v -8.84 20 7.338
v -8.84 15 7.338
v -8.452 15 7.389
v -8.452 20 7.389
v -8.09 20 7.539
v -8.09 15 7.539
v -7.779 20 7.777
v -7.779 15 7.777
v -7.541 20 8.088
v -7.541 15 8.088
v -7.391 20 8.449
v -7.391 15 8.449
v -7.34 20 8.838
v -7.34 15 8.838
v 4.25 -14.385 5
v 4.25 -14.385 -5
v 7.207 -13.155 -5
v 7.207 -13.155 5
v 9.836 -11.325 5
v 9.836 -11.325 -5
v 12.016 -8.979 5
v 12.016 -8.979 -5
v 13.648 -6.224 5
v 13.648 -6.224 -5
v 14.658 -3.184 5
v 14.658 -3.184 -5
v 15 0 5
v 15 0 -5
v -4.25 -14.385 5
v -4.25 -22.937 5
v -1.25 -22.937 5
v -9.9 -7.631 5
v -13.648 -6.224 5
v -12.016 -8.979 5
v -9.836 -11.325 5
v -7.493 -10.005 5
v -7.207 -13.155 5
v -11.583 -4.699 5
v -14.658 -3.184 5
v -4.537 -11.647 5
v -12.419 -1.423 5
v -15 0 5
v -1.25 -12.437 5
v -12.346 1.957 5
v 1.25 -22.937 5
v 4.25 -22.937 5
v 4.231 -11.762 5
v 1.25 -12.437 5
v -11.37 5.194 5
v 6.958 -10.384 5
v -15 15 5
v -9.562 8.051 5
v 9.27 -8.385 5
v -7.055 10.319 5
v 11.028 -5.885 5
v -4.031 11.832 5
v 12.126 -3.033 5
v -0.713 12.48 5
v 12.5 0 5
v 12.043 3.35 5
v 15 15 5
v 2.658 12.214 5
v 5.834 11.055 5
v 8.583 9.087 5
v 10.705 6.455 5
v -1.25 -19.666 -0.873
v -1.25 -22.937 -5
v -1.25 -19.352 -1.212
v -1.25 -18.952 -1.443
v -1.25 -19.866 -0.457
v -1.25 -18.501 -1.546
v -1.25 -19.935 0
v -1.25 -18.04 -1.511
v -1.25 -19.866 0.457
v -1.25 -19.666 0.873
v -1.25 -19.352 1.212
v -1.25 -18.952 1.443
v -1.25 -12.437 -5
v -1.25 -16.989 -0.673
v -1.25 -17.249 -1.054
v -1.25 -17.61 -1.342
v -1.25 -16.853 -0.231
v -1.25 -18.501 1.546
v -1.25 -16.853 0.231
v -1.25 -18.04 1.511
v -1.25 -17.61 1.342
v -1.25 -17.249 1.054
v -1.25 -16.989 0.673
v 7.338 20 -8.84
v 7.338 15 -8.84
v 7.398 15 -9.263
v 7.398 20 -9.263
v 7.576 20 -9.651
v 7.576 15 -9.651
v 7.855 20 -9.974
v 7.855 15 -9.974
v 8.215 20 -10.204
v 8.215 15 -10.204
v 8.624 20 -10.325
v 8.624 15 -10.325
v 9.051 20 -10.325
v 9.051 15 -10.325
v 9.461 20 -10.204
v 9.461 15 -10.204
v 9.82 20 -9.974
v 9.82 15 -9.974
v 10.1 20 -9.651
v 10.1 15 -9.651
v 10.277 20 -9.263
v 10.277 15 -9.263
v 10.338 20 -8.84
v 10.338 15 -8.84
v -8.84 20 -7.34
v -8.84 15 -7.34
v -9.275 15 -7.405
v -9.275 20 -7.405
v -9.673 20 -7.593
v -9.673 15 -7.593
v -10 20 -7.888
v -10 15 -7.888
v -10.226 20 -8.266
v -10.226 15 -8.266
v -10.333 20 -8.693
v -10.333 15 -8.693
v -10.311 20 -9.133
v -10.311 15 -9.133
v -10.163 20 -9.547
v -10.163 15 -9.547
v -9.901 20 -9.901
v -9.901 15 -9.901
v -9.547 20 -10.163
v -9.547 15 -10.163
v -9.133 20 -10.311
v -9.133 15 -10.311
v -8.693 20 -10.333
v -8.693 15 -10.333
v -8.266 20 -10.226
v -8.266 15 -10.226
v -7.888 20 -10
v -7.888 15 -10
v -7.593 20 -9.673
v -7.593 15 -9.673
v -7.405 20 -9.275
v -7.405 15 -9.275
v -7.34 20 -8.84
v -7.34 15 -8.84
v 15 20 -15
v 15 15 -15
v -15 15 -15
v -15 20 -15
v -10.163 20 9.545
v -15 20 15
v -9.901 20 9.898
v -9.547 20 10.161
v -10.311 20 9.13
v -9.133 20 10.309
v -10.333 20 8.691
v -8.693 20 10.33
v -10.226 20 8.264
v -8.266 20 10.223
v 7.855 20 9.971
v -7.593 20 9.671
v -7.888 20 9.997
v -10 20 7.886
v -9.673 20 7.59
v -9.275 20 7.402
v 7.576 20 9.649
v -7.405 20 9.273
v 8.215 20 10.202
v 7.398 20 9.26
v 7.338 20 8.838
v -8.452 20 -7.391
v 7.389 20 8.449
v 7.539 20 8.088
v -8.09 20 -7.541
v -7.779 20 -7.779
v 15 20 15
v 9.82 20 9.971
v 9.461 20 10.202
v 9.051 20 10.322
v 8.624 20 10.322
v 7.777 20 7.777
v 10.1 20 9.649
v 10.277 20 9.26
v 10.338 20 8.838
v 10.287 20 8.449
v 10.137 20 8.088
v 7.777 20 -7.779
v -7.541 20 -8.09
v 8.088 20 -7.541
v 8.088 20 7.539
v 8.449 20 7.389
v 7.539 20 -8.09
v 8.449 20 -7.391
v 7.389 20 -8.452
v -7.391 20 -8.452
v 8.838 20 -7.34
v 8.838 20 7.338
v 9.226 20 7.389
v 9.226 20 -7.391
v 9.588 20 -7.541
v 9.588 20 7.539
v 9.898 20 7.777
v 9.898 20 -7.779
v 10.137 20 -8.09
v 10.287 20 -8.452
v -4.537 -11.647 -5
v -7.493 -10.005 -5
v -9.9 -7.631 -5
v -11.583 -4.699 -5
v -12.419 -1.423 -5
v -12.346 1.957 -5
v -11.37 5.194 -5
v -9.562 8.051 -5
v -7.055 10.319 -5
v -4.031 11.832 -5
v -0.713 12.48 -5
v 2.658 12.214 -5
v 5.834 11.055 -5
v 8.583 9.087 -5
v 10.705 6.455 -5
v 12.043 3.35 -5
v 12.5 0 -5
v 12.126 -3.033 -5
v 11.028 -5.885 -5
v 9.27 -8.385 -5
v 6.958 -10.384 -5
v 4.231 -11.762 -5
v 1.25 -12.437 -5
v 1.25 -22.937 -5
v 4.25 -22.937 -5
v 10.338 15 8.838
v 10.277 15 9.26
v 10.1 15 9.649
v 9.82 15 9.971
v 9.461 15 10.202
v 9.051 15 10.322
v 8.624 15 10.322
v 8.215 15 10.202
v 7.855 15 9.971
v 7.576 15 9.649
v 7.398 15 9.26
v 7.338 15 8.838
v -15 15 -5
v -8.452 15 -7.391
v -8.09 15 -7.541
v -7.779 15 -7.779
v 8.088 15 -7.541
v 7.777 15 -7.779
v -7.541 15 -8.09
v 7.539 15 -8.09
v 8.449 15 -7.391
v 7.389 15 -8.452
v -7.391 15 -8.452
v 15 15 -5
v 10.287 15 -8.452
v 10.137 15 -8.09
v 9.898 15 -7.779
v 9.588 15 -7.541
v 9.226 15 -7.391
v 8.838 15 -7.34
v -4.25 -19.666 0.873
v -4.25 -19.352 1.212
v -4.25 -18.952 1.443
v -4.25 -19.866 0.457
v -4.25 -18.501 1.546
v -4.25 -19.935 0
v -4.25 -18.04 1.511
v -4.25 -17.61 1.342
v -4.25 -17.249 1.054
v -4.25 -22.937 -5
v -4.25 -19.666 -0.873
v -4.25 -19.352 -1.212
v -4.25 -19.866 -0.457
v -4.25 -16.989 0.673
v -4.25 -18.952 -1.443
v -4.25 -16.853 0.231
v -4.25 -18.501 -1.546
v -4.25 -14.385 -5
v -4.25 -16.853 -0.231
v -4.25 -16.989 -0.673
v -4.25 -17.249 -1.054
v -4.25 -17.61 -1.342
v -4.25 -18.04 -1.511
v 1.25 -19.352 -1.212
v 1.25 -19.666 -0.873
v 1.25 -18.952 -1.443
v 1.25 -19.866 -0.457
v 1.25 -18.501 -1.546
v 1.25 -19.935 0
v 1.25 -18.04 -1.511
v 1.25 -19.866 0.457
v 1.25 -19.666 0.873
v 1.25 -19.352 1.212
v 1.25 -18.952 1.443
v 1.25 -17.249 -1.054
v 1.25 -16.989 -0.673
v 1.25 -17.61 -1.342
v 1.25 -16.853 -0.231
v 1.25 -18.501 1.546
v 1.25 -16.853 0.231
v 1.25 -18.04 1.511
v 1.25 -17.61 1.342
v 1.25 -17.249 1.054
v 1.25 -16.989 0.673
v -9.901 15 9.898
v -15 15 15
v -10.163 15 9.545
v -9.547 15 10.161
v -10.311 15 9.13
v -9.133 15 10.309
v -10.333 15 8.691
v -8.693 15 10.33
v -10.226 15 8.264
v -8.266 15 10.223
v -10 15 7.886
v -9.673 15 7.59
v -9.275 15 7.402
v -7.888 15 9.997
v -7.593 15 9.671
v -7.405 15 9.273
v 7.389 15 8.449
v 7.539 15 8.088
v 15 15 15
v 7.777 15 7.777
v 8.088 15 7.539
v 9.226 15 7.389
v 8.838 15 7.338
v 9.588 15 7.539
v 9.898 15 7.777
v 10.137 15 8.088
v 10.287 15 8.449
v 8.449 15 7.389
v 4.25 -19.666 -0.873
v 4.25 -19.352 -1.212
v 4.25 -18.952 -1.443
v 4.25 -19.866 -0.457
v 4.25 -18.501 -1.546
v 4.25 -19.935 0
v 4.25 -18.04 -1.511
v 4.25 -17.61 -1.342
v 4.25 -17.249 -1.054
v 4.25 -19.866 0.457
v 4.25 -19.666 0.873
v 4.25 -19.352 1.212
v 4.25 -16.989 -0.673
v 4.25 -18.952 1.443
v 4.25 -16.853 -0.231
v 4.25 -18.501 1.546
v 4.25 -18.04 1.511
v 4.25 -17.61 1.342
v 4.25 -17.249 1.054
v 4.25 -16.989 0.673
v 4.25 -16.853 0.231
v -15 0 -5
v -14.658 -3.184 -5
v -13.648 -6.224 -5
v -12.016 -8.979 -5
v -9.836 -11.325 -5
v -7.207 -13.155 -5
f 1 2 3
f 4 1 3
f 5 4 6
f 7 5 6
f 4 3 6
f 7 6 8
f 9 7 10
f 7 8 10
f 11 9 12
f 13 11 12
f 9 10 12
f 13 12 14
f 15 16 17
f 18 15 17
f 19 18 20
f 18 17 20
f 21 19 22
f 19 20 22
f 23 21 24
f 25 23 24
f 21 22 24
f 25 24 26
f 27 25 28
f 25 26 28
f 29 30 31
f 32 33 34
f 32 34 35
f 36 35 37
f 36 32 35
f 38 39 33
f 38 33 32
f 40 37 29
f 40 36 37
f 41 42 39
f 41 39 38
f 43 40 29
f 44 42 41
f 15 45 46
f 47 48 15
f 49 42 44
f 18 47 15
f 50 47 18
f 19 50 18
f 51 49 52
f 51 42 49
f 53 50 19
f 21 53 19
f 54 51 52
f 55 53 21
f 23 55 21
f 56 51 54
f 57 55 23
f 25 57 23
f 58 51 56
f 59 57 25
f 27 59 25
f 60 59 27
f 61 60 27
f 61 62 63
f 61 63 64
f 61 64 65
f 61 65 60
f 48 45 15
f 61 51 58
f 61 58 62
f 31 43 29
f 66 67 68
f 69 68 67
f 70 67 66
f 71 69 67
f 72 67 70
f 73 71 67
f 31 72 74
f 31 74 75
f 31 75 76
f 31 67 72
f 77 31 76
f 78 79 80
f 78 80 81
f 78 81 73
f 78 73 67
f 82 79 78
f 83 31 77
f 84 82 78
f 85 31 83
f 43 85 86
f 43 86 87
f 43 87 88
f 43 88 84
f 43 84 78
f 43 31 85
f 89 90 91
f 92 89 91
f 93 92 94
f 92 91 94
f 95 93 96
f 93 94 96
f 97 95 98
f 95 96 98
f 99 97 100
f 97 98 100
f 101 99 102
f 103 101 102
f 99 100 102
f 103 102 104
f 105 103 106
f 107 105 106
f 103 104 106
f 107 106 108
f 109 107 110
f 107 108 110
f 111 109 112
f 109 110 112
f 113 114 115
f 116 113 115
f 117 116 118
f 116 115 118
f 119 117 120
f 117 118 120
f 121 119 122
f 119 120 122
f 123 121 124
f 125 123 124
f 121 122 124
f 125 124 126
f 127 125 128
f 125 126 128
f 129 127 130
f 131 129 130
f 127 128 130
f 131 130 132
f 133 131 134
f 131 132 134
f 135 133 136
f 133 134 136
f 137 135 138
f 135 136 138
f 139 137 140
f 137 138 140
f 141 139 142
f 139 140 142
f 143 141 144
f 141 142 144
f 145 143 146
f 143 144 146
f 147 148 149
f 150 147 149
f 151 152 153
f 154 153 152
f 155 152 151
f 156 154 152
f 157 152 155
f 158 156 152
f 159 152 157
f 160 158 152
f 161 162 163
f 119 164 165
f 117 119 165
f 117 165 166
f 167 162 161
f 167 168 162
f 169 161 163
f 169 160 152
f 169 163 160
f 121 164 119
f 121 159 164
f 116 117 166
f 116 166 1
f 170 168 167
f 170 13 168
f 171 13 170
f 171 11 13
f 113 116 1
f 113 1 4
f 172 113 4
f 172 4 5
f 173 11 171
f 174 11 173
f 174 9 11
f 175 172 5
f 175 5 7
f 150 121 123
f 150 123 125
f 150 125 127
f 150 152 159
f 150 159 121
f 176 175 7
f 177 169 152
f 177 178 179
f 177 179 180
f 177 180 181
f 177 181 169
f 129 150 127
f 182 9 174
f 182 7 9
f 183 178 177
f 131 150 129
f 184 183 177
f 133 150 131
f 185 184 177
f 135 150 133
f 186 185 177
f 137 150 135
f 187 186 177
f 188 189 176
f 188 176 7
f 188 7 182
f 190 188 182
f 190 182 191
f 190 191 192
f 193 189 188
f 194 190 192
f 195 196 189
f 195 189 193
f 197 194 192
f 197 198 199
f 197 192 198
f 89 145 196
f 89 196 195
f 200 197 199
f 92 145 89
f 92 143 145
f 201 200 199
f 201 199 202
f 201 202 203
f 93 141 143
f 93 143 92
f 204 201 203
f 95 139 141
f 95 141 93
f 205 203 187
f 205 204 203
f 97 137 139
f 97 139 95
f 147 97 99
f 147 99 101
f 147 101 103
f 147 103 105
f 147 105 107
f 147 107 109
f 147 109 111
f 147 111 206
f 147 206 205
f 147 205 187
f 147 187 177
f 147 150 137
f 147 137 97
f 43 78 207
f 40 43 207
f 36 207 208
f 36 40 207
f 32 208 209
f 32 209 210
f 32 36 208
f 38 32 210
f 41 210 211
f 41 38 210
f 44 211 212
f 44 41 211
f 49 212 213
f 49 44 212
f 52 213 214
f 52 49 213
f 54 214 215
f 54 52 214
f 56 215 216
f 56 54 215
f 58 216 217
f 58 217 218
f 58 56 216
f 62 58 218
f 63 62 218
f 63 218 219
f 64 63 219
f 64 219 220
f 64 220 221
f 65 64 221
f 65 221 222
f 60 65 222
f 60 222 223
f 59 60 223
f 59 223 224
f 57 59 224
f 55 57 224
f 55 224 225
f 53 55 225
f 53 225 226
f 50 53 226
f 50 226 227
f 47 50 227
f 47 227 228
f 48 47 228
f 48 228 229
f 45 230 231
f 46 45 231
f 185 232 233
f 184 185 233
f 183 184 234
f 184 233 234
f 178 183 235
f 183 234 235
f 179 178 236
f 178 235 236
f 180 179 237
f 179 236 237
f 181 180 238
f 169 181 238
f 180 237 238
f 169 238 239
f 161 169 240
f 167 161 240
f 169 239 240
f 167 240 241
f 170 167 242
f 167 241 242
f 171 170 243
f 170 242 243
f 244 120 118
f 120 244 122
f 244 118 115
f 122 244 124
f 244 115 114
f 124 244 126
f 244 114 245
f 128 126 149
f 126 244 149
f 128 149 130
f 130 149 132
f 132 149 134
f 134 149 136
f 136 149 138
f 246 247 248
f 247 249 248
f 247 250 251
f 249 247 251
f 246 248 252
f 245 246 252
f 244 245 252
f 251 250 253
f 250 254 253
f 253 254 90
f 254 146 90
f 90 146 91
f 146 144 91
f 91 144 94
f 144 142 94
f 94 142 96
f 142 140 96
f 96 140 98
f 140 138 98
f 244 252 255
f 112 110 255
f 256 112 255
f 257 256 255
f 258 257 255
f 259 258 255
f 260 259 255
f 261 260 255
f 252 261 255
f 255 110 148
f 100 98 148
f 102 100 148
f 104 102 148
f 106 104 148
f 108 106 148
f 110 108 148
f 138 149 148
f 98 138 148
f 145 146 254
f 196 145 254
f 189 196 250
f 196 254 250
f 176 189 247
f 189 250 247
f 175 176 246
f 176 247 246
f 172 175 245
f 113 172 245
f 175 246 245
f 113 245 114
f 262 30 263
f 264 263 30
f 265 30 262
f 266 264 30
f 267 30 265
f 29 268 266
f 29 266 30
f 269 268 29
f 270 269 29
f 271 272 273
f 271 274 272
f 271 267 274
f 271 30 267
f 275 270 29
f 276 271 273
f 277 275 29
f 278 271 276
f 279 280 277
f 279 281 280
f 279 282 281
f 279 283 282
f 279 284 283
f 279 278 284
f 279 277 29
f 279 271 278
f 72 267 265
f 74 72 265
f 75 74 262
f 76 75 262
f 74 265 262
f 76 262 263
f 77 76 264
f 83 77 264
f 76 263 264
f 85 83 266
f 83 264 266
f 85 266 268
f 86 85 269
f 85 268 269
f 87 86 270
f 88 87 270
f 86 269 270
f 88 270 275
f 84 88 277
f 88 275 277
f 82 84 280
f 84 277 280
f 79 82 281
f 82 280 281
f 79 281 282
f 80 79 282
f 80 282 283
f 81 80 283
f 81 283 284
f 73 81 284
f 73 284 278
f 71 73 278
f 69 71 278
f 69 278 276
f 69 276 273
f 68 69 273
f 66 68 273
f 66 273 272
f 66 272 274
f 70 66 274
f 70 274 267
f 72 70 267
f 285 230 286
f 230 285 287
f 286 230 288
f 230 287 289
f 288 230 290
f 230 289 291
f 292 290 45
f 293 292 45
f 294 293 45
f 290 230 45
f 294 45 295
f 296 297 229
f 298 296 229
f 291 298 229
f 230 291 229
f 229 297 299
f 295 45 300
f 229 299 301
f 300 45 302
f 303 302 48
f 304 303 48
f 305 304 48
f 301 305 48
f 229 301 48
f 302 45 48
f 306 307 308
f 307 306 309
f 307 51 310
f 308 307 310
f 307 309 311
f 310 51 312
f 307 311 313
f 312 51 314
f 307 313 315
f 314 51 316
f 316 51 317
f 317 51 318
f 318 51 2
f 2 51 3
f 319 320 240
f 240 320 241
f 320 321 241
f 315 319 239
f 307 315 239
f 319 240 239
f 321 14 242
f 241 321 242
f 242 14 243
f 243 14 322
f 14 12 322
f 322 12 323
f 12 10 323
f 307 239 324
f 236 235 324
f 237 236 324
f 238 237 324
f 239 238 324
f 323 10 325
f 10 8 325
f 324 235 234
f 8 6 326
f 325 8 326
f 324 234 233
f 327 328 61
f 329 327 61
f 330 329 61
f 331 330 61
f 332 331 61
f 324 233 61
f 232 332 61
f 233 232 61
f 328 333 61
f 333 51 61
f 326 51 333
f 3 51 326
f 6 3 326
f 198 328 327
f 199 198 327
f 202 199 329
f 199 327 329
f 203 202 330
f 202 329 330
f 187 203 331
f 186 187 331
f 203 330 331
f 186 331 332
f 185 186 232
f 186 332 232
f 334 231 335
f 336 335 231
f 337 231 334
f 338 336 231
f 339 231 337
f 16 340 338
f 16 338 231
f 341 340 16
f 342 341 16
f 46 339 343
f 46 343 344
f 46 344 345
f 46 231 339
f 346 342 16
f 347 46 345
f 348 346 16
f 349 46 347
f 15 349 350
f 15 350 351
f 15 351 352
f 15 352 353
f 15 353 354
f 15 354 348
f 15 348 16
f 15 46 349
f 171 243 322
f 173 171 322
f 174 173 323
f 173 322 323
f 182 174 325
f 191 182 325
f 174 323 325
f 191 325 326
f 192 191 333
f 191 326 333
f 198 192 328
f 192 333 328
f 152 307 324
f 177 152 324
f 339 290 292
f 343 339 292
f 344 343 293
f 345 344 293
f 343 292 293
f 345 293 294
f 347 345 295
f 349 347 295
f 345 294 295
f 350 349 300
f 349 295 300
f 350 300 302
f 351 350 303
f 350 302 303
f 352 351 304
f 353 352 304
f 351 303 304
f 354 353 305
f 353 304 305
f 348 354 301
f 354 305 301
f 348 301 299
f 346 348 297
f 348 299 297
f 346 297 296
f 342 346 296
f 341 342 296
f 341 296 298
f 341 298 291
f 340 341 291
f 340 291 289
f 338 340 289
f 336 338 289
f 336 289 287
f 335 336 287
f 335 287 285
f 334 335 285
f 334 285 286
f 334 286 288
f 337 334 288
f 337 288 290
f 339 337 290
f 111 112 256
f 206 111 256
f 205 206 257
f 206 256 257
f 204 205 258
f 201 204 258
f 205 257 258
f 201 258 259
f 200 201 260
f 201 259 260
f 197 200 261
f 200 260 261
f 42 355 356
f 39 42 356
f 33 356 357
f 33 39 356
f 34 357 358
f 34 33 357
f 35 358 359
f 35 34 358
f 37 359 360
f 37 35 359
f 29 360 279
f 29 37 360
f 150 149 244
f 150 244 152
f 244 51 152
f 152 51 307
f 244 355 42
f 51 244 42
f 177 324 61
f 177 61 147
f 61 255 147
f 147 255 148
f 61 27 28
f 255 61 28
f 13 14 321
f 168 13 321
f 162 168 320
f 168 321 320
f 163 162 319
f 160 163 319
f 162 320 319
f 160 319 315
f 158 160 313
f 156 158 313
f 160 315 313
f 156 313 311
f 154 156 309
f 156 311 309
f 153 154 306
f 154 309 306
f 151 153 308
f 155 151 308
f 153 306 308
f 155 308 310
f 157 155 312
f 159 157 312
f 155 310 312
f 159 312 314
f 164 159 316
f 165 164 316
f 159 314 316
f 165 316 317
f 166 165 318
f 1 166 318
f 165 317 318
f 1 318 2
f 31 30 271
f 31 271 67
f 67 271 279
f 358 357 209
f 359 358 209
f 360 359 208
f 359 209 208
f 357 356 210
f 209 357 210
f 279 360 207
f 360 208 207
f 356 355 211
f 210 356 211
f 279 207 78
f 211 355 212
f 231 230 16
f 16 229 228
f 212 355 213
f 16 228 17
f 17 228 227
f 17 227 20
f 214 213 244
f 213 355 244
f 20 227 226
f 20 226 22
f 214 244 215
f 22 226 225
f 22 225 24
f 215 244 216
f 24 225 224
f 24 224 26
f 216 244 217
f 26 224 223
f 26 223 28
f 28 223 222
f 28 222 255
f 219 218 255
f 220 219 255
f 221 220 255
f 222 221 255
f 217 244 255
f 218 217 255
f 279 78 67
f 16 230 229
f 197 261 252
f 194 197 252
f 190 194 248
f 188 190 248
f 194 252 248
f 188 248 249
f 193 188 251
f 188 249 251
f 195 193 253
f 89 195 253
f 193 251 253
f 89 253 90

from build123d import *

# Parameters (mm, degrees)
BOSS_EXTRUDE1_DEPTH = 5
SKETCH2_W           = 3
SKETCH2_H           = 10.5
BOSS_EXTRUDE2_DEPTH = 5
CUT_EXTRUDE1_REACH  = 32.359
SKETCH3_R           = 1.55
SKETCH4_W           = 6.16233047
SKETCH4_H           = 10
SKETCH4_W_2         = 6.16
SKETCH4_W_3         = 17.67766953
BOSS_EXTRUDE3_DEPTH = 5


with BuildPart() as part:
    # Sketch1 → Boss-Extrude1 (new, symmetric)
    with BuildSketch(Plane.XY):
        with BuildLine():
            Line((-15, 15), (-15, 0))
            ThreePointArc((-15, 0), (-10.606601721, 10.606601715), (-8e-09, 15))
            Line((-8e-09, 15), (-15, 15))
        make_face()
        with BuildLine():
            Line((15, 15), (-8e-09, 15))
            ThreePointArc((-8e-09, 15), (10.606601715, 10.606601721), (15, 0))
            Line((15, 0), (15, 15))
        make_face()
        with BuildLine():
            ThreePointArc((-8e-09, 15), (-10.606601721, 10.606601715), (-15, 0))
            ThreePointArc((-15, 0), (-11.039701083, -10.155048006), (-1.25, -14.947825929))
            Line((-1.25, -14.947825929), (-1.25, -12.437342964))
            ThreePointArc((-1.25, -12.437342964), (-8.385254916, 9.270248109), (12.5, 0))
            ThreePointArc((12.5, 0), (9.270248109, -8.385254916), (1.25, -12.437342964))
            Line((1.25, -12.437342964), (1.25, -14.947825929))
            ThreePointArc((1.25, -14.947825929), (11.039701083, -10.155048006), (15, 0))
            ThreePointArc((15, 0), (10.606601715, 10.606601721), (-8e-09, 15))
        make_face()
    extrude(amount=BOSS_EXTRUDE1_DEPTH, both=True)

    # Sketch2 → Boss-Extrude2 (add, symmetric)
    with BuildSketch(Plane.XY):
        with Locations((-2.75, -17.687342964)):
            Rectangle(SKETCH2_W, SKETCH2_H)
        with Locations((2.75, -17.687342964)):
            Rectangle(SKETCH2_W, SKETCH2_H)
    extrude(amount=BOSS_EXTRUDE2_DEPTH, both=True)

    # Cut-Extrude1: up to this face of the body (flat: up to its plane)
    cut_extrude1_end = Plane(part.part.faces().sort_by_distance((4.25, -18.661332672, 0))[0])
    # Sketch3 → Cut-Extrude1 (cut, up to the picked face)
    with BuildSketch(Plane.ZY.offset(4.25), mode=Mode.PRIVATE) as cut_extrude1_sk1:
        with Locations(Location((0, -18.385322381, 0), (0, 0, 270))):
            Circle(SKETCH3_R)
    cut_extrude1_tool1 = split(extrude(cut_extrude1_sk1.sketch, amount=-CUT_EXTRUDE1_REACH, mode=Mode.PRIVATE), bisect_by=cut_extrude1_end, keep=Keep.BOTH, mode=Mode.PRIVATE)
    add(cut_extrude1_tool1.solids().sort_by(Axis((-4.25, -18.385322, 0), (1, 0, 0)))[0], mode=Mode.SUBTRACT)

    # Sketch4 → Boss-Extrude3 (add)
    with BuildSketch(Plane(origin=(0, 15, 0), x_dir=(1, 0, 0), z_dir=(0, 1, 0))):
        with BuildLine():
            Line((15, 15), (-15, 15))
            Line((-15, 15), (-15, 5))
            Line((-15, 5), (-8.84, 5))
            Line((-8.84, 5), (-8.84, 7.34))
            ThreePointArc((-8.84, 7.34), (-9.900660172, 9.900660172), (-7.34, 8.84))
            Line((-7.34, 8.84), (7.33766953, 8.84))
            ThreePointArc((7.33766953, 8.84), (8.83766953, 10.34), (10.33766953, 8.84))
            ThreePointArc((10.33766953, 8.84), (9.898329701, 7.779339828), (8.83766953, 7.34))
            Line((8.83766953, 7.34), (8.83766953, 5))
            Line((8.83766953, 5), (15, 5))
            Line((15, 5), (15, 15))
        make_face()
        with Locations((11.918834765, 0)):
            Rectangle(SKETCH4_W, SKETCH4_H)
        with BuildLine():
            Line((-8.84, -5), (-15, -5))
            Line((-15, -5), (-15, -15))
            Line((-15, -15), (15, -15))
            Line((15, -15), (15, -5))
            Line((15, -5), (8.83766953, -5))
            Line((8.83766953, -5), (8.83766953, -7.33766953))
            ThreePointArc((8.83766953, -7.33766953), (9.898329701, -7.777009358), (10.33766953, -8.83766953))
            ThreePointArc((10.33766953, -8.83766953), (8.83766953, -10.33766953), (7.33766953, -8.83766953))
            Line((7.33766953, -8.83766953), (-7.34, -8.83766953))
            ThreePointArc((-7.34, -8.83766953), (-9.900660172, -9.898329701), (-8.84, -7.33766953))
            Line((-8.84, -7.33766953), (-8.84, -5))
        make_face()
        with Locations((-11.92, 0)):
            Rectangle(SKETCH4_W_2, SKETCH4_H)
        with BuildLine():
            Line((8.83766953, -5), (-8.84, -5))
            Line((-8.84, -5), (-8.84, -7.33766953))
            ThreePointArc((-8.84, -7.33766953), (-7.779339828, -7.777009358), (-7.34, -8.83766953))
            Line((-7.34, -8.83766953), (7.33766953, -8.83766953))
            ThreePointArc((7.33766953, -8.83766953), (7.777009358, -7.777009358), (8.83766953, -7.33766953))
            Line((8.83766953, -7.33766953), (8.83766953, -5))
        make_face()
        with Locations((-0.001165235, 0)):
            Rectangle(SKETCH4_W_3, SKETCH4_H)
        with BuildLine():
            Line((-8.84, 7.34), (-8.84, 5))
            Line((-8.84, 5), (8.83766953, 5))
            Line((8.83766953, 5), (8.83766953, 7.34))
            ThreePointArc((8.83766953, 7.34), (7.777009358, 7.779339828), (7.33766953, 8.84))
            Line((7.33766953, 8.84), (-7.34, 8.84))
            ThreePointArc((-7.34, 8.84), (-7.779339828, 7.779339828), (-8.84, 7.34))
        make_face()
    extrude(amount=BOSS_EXTRUDE3_DEPTH)


solid = part.part
